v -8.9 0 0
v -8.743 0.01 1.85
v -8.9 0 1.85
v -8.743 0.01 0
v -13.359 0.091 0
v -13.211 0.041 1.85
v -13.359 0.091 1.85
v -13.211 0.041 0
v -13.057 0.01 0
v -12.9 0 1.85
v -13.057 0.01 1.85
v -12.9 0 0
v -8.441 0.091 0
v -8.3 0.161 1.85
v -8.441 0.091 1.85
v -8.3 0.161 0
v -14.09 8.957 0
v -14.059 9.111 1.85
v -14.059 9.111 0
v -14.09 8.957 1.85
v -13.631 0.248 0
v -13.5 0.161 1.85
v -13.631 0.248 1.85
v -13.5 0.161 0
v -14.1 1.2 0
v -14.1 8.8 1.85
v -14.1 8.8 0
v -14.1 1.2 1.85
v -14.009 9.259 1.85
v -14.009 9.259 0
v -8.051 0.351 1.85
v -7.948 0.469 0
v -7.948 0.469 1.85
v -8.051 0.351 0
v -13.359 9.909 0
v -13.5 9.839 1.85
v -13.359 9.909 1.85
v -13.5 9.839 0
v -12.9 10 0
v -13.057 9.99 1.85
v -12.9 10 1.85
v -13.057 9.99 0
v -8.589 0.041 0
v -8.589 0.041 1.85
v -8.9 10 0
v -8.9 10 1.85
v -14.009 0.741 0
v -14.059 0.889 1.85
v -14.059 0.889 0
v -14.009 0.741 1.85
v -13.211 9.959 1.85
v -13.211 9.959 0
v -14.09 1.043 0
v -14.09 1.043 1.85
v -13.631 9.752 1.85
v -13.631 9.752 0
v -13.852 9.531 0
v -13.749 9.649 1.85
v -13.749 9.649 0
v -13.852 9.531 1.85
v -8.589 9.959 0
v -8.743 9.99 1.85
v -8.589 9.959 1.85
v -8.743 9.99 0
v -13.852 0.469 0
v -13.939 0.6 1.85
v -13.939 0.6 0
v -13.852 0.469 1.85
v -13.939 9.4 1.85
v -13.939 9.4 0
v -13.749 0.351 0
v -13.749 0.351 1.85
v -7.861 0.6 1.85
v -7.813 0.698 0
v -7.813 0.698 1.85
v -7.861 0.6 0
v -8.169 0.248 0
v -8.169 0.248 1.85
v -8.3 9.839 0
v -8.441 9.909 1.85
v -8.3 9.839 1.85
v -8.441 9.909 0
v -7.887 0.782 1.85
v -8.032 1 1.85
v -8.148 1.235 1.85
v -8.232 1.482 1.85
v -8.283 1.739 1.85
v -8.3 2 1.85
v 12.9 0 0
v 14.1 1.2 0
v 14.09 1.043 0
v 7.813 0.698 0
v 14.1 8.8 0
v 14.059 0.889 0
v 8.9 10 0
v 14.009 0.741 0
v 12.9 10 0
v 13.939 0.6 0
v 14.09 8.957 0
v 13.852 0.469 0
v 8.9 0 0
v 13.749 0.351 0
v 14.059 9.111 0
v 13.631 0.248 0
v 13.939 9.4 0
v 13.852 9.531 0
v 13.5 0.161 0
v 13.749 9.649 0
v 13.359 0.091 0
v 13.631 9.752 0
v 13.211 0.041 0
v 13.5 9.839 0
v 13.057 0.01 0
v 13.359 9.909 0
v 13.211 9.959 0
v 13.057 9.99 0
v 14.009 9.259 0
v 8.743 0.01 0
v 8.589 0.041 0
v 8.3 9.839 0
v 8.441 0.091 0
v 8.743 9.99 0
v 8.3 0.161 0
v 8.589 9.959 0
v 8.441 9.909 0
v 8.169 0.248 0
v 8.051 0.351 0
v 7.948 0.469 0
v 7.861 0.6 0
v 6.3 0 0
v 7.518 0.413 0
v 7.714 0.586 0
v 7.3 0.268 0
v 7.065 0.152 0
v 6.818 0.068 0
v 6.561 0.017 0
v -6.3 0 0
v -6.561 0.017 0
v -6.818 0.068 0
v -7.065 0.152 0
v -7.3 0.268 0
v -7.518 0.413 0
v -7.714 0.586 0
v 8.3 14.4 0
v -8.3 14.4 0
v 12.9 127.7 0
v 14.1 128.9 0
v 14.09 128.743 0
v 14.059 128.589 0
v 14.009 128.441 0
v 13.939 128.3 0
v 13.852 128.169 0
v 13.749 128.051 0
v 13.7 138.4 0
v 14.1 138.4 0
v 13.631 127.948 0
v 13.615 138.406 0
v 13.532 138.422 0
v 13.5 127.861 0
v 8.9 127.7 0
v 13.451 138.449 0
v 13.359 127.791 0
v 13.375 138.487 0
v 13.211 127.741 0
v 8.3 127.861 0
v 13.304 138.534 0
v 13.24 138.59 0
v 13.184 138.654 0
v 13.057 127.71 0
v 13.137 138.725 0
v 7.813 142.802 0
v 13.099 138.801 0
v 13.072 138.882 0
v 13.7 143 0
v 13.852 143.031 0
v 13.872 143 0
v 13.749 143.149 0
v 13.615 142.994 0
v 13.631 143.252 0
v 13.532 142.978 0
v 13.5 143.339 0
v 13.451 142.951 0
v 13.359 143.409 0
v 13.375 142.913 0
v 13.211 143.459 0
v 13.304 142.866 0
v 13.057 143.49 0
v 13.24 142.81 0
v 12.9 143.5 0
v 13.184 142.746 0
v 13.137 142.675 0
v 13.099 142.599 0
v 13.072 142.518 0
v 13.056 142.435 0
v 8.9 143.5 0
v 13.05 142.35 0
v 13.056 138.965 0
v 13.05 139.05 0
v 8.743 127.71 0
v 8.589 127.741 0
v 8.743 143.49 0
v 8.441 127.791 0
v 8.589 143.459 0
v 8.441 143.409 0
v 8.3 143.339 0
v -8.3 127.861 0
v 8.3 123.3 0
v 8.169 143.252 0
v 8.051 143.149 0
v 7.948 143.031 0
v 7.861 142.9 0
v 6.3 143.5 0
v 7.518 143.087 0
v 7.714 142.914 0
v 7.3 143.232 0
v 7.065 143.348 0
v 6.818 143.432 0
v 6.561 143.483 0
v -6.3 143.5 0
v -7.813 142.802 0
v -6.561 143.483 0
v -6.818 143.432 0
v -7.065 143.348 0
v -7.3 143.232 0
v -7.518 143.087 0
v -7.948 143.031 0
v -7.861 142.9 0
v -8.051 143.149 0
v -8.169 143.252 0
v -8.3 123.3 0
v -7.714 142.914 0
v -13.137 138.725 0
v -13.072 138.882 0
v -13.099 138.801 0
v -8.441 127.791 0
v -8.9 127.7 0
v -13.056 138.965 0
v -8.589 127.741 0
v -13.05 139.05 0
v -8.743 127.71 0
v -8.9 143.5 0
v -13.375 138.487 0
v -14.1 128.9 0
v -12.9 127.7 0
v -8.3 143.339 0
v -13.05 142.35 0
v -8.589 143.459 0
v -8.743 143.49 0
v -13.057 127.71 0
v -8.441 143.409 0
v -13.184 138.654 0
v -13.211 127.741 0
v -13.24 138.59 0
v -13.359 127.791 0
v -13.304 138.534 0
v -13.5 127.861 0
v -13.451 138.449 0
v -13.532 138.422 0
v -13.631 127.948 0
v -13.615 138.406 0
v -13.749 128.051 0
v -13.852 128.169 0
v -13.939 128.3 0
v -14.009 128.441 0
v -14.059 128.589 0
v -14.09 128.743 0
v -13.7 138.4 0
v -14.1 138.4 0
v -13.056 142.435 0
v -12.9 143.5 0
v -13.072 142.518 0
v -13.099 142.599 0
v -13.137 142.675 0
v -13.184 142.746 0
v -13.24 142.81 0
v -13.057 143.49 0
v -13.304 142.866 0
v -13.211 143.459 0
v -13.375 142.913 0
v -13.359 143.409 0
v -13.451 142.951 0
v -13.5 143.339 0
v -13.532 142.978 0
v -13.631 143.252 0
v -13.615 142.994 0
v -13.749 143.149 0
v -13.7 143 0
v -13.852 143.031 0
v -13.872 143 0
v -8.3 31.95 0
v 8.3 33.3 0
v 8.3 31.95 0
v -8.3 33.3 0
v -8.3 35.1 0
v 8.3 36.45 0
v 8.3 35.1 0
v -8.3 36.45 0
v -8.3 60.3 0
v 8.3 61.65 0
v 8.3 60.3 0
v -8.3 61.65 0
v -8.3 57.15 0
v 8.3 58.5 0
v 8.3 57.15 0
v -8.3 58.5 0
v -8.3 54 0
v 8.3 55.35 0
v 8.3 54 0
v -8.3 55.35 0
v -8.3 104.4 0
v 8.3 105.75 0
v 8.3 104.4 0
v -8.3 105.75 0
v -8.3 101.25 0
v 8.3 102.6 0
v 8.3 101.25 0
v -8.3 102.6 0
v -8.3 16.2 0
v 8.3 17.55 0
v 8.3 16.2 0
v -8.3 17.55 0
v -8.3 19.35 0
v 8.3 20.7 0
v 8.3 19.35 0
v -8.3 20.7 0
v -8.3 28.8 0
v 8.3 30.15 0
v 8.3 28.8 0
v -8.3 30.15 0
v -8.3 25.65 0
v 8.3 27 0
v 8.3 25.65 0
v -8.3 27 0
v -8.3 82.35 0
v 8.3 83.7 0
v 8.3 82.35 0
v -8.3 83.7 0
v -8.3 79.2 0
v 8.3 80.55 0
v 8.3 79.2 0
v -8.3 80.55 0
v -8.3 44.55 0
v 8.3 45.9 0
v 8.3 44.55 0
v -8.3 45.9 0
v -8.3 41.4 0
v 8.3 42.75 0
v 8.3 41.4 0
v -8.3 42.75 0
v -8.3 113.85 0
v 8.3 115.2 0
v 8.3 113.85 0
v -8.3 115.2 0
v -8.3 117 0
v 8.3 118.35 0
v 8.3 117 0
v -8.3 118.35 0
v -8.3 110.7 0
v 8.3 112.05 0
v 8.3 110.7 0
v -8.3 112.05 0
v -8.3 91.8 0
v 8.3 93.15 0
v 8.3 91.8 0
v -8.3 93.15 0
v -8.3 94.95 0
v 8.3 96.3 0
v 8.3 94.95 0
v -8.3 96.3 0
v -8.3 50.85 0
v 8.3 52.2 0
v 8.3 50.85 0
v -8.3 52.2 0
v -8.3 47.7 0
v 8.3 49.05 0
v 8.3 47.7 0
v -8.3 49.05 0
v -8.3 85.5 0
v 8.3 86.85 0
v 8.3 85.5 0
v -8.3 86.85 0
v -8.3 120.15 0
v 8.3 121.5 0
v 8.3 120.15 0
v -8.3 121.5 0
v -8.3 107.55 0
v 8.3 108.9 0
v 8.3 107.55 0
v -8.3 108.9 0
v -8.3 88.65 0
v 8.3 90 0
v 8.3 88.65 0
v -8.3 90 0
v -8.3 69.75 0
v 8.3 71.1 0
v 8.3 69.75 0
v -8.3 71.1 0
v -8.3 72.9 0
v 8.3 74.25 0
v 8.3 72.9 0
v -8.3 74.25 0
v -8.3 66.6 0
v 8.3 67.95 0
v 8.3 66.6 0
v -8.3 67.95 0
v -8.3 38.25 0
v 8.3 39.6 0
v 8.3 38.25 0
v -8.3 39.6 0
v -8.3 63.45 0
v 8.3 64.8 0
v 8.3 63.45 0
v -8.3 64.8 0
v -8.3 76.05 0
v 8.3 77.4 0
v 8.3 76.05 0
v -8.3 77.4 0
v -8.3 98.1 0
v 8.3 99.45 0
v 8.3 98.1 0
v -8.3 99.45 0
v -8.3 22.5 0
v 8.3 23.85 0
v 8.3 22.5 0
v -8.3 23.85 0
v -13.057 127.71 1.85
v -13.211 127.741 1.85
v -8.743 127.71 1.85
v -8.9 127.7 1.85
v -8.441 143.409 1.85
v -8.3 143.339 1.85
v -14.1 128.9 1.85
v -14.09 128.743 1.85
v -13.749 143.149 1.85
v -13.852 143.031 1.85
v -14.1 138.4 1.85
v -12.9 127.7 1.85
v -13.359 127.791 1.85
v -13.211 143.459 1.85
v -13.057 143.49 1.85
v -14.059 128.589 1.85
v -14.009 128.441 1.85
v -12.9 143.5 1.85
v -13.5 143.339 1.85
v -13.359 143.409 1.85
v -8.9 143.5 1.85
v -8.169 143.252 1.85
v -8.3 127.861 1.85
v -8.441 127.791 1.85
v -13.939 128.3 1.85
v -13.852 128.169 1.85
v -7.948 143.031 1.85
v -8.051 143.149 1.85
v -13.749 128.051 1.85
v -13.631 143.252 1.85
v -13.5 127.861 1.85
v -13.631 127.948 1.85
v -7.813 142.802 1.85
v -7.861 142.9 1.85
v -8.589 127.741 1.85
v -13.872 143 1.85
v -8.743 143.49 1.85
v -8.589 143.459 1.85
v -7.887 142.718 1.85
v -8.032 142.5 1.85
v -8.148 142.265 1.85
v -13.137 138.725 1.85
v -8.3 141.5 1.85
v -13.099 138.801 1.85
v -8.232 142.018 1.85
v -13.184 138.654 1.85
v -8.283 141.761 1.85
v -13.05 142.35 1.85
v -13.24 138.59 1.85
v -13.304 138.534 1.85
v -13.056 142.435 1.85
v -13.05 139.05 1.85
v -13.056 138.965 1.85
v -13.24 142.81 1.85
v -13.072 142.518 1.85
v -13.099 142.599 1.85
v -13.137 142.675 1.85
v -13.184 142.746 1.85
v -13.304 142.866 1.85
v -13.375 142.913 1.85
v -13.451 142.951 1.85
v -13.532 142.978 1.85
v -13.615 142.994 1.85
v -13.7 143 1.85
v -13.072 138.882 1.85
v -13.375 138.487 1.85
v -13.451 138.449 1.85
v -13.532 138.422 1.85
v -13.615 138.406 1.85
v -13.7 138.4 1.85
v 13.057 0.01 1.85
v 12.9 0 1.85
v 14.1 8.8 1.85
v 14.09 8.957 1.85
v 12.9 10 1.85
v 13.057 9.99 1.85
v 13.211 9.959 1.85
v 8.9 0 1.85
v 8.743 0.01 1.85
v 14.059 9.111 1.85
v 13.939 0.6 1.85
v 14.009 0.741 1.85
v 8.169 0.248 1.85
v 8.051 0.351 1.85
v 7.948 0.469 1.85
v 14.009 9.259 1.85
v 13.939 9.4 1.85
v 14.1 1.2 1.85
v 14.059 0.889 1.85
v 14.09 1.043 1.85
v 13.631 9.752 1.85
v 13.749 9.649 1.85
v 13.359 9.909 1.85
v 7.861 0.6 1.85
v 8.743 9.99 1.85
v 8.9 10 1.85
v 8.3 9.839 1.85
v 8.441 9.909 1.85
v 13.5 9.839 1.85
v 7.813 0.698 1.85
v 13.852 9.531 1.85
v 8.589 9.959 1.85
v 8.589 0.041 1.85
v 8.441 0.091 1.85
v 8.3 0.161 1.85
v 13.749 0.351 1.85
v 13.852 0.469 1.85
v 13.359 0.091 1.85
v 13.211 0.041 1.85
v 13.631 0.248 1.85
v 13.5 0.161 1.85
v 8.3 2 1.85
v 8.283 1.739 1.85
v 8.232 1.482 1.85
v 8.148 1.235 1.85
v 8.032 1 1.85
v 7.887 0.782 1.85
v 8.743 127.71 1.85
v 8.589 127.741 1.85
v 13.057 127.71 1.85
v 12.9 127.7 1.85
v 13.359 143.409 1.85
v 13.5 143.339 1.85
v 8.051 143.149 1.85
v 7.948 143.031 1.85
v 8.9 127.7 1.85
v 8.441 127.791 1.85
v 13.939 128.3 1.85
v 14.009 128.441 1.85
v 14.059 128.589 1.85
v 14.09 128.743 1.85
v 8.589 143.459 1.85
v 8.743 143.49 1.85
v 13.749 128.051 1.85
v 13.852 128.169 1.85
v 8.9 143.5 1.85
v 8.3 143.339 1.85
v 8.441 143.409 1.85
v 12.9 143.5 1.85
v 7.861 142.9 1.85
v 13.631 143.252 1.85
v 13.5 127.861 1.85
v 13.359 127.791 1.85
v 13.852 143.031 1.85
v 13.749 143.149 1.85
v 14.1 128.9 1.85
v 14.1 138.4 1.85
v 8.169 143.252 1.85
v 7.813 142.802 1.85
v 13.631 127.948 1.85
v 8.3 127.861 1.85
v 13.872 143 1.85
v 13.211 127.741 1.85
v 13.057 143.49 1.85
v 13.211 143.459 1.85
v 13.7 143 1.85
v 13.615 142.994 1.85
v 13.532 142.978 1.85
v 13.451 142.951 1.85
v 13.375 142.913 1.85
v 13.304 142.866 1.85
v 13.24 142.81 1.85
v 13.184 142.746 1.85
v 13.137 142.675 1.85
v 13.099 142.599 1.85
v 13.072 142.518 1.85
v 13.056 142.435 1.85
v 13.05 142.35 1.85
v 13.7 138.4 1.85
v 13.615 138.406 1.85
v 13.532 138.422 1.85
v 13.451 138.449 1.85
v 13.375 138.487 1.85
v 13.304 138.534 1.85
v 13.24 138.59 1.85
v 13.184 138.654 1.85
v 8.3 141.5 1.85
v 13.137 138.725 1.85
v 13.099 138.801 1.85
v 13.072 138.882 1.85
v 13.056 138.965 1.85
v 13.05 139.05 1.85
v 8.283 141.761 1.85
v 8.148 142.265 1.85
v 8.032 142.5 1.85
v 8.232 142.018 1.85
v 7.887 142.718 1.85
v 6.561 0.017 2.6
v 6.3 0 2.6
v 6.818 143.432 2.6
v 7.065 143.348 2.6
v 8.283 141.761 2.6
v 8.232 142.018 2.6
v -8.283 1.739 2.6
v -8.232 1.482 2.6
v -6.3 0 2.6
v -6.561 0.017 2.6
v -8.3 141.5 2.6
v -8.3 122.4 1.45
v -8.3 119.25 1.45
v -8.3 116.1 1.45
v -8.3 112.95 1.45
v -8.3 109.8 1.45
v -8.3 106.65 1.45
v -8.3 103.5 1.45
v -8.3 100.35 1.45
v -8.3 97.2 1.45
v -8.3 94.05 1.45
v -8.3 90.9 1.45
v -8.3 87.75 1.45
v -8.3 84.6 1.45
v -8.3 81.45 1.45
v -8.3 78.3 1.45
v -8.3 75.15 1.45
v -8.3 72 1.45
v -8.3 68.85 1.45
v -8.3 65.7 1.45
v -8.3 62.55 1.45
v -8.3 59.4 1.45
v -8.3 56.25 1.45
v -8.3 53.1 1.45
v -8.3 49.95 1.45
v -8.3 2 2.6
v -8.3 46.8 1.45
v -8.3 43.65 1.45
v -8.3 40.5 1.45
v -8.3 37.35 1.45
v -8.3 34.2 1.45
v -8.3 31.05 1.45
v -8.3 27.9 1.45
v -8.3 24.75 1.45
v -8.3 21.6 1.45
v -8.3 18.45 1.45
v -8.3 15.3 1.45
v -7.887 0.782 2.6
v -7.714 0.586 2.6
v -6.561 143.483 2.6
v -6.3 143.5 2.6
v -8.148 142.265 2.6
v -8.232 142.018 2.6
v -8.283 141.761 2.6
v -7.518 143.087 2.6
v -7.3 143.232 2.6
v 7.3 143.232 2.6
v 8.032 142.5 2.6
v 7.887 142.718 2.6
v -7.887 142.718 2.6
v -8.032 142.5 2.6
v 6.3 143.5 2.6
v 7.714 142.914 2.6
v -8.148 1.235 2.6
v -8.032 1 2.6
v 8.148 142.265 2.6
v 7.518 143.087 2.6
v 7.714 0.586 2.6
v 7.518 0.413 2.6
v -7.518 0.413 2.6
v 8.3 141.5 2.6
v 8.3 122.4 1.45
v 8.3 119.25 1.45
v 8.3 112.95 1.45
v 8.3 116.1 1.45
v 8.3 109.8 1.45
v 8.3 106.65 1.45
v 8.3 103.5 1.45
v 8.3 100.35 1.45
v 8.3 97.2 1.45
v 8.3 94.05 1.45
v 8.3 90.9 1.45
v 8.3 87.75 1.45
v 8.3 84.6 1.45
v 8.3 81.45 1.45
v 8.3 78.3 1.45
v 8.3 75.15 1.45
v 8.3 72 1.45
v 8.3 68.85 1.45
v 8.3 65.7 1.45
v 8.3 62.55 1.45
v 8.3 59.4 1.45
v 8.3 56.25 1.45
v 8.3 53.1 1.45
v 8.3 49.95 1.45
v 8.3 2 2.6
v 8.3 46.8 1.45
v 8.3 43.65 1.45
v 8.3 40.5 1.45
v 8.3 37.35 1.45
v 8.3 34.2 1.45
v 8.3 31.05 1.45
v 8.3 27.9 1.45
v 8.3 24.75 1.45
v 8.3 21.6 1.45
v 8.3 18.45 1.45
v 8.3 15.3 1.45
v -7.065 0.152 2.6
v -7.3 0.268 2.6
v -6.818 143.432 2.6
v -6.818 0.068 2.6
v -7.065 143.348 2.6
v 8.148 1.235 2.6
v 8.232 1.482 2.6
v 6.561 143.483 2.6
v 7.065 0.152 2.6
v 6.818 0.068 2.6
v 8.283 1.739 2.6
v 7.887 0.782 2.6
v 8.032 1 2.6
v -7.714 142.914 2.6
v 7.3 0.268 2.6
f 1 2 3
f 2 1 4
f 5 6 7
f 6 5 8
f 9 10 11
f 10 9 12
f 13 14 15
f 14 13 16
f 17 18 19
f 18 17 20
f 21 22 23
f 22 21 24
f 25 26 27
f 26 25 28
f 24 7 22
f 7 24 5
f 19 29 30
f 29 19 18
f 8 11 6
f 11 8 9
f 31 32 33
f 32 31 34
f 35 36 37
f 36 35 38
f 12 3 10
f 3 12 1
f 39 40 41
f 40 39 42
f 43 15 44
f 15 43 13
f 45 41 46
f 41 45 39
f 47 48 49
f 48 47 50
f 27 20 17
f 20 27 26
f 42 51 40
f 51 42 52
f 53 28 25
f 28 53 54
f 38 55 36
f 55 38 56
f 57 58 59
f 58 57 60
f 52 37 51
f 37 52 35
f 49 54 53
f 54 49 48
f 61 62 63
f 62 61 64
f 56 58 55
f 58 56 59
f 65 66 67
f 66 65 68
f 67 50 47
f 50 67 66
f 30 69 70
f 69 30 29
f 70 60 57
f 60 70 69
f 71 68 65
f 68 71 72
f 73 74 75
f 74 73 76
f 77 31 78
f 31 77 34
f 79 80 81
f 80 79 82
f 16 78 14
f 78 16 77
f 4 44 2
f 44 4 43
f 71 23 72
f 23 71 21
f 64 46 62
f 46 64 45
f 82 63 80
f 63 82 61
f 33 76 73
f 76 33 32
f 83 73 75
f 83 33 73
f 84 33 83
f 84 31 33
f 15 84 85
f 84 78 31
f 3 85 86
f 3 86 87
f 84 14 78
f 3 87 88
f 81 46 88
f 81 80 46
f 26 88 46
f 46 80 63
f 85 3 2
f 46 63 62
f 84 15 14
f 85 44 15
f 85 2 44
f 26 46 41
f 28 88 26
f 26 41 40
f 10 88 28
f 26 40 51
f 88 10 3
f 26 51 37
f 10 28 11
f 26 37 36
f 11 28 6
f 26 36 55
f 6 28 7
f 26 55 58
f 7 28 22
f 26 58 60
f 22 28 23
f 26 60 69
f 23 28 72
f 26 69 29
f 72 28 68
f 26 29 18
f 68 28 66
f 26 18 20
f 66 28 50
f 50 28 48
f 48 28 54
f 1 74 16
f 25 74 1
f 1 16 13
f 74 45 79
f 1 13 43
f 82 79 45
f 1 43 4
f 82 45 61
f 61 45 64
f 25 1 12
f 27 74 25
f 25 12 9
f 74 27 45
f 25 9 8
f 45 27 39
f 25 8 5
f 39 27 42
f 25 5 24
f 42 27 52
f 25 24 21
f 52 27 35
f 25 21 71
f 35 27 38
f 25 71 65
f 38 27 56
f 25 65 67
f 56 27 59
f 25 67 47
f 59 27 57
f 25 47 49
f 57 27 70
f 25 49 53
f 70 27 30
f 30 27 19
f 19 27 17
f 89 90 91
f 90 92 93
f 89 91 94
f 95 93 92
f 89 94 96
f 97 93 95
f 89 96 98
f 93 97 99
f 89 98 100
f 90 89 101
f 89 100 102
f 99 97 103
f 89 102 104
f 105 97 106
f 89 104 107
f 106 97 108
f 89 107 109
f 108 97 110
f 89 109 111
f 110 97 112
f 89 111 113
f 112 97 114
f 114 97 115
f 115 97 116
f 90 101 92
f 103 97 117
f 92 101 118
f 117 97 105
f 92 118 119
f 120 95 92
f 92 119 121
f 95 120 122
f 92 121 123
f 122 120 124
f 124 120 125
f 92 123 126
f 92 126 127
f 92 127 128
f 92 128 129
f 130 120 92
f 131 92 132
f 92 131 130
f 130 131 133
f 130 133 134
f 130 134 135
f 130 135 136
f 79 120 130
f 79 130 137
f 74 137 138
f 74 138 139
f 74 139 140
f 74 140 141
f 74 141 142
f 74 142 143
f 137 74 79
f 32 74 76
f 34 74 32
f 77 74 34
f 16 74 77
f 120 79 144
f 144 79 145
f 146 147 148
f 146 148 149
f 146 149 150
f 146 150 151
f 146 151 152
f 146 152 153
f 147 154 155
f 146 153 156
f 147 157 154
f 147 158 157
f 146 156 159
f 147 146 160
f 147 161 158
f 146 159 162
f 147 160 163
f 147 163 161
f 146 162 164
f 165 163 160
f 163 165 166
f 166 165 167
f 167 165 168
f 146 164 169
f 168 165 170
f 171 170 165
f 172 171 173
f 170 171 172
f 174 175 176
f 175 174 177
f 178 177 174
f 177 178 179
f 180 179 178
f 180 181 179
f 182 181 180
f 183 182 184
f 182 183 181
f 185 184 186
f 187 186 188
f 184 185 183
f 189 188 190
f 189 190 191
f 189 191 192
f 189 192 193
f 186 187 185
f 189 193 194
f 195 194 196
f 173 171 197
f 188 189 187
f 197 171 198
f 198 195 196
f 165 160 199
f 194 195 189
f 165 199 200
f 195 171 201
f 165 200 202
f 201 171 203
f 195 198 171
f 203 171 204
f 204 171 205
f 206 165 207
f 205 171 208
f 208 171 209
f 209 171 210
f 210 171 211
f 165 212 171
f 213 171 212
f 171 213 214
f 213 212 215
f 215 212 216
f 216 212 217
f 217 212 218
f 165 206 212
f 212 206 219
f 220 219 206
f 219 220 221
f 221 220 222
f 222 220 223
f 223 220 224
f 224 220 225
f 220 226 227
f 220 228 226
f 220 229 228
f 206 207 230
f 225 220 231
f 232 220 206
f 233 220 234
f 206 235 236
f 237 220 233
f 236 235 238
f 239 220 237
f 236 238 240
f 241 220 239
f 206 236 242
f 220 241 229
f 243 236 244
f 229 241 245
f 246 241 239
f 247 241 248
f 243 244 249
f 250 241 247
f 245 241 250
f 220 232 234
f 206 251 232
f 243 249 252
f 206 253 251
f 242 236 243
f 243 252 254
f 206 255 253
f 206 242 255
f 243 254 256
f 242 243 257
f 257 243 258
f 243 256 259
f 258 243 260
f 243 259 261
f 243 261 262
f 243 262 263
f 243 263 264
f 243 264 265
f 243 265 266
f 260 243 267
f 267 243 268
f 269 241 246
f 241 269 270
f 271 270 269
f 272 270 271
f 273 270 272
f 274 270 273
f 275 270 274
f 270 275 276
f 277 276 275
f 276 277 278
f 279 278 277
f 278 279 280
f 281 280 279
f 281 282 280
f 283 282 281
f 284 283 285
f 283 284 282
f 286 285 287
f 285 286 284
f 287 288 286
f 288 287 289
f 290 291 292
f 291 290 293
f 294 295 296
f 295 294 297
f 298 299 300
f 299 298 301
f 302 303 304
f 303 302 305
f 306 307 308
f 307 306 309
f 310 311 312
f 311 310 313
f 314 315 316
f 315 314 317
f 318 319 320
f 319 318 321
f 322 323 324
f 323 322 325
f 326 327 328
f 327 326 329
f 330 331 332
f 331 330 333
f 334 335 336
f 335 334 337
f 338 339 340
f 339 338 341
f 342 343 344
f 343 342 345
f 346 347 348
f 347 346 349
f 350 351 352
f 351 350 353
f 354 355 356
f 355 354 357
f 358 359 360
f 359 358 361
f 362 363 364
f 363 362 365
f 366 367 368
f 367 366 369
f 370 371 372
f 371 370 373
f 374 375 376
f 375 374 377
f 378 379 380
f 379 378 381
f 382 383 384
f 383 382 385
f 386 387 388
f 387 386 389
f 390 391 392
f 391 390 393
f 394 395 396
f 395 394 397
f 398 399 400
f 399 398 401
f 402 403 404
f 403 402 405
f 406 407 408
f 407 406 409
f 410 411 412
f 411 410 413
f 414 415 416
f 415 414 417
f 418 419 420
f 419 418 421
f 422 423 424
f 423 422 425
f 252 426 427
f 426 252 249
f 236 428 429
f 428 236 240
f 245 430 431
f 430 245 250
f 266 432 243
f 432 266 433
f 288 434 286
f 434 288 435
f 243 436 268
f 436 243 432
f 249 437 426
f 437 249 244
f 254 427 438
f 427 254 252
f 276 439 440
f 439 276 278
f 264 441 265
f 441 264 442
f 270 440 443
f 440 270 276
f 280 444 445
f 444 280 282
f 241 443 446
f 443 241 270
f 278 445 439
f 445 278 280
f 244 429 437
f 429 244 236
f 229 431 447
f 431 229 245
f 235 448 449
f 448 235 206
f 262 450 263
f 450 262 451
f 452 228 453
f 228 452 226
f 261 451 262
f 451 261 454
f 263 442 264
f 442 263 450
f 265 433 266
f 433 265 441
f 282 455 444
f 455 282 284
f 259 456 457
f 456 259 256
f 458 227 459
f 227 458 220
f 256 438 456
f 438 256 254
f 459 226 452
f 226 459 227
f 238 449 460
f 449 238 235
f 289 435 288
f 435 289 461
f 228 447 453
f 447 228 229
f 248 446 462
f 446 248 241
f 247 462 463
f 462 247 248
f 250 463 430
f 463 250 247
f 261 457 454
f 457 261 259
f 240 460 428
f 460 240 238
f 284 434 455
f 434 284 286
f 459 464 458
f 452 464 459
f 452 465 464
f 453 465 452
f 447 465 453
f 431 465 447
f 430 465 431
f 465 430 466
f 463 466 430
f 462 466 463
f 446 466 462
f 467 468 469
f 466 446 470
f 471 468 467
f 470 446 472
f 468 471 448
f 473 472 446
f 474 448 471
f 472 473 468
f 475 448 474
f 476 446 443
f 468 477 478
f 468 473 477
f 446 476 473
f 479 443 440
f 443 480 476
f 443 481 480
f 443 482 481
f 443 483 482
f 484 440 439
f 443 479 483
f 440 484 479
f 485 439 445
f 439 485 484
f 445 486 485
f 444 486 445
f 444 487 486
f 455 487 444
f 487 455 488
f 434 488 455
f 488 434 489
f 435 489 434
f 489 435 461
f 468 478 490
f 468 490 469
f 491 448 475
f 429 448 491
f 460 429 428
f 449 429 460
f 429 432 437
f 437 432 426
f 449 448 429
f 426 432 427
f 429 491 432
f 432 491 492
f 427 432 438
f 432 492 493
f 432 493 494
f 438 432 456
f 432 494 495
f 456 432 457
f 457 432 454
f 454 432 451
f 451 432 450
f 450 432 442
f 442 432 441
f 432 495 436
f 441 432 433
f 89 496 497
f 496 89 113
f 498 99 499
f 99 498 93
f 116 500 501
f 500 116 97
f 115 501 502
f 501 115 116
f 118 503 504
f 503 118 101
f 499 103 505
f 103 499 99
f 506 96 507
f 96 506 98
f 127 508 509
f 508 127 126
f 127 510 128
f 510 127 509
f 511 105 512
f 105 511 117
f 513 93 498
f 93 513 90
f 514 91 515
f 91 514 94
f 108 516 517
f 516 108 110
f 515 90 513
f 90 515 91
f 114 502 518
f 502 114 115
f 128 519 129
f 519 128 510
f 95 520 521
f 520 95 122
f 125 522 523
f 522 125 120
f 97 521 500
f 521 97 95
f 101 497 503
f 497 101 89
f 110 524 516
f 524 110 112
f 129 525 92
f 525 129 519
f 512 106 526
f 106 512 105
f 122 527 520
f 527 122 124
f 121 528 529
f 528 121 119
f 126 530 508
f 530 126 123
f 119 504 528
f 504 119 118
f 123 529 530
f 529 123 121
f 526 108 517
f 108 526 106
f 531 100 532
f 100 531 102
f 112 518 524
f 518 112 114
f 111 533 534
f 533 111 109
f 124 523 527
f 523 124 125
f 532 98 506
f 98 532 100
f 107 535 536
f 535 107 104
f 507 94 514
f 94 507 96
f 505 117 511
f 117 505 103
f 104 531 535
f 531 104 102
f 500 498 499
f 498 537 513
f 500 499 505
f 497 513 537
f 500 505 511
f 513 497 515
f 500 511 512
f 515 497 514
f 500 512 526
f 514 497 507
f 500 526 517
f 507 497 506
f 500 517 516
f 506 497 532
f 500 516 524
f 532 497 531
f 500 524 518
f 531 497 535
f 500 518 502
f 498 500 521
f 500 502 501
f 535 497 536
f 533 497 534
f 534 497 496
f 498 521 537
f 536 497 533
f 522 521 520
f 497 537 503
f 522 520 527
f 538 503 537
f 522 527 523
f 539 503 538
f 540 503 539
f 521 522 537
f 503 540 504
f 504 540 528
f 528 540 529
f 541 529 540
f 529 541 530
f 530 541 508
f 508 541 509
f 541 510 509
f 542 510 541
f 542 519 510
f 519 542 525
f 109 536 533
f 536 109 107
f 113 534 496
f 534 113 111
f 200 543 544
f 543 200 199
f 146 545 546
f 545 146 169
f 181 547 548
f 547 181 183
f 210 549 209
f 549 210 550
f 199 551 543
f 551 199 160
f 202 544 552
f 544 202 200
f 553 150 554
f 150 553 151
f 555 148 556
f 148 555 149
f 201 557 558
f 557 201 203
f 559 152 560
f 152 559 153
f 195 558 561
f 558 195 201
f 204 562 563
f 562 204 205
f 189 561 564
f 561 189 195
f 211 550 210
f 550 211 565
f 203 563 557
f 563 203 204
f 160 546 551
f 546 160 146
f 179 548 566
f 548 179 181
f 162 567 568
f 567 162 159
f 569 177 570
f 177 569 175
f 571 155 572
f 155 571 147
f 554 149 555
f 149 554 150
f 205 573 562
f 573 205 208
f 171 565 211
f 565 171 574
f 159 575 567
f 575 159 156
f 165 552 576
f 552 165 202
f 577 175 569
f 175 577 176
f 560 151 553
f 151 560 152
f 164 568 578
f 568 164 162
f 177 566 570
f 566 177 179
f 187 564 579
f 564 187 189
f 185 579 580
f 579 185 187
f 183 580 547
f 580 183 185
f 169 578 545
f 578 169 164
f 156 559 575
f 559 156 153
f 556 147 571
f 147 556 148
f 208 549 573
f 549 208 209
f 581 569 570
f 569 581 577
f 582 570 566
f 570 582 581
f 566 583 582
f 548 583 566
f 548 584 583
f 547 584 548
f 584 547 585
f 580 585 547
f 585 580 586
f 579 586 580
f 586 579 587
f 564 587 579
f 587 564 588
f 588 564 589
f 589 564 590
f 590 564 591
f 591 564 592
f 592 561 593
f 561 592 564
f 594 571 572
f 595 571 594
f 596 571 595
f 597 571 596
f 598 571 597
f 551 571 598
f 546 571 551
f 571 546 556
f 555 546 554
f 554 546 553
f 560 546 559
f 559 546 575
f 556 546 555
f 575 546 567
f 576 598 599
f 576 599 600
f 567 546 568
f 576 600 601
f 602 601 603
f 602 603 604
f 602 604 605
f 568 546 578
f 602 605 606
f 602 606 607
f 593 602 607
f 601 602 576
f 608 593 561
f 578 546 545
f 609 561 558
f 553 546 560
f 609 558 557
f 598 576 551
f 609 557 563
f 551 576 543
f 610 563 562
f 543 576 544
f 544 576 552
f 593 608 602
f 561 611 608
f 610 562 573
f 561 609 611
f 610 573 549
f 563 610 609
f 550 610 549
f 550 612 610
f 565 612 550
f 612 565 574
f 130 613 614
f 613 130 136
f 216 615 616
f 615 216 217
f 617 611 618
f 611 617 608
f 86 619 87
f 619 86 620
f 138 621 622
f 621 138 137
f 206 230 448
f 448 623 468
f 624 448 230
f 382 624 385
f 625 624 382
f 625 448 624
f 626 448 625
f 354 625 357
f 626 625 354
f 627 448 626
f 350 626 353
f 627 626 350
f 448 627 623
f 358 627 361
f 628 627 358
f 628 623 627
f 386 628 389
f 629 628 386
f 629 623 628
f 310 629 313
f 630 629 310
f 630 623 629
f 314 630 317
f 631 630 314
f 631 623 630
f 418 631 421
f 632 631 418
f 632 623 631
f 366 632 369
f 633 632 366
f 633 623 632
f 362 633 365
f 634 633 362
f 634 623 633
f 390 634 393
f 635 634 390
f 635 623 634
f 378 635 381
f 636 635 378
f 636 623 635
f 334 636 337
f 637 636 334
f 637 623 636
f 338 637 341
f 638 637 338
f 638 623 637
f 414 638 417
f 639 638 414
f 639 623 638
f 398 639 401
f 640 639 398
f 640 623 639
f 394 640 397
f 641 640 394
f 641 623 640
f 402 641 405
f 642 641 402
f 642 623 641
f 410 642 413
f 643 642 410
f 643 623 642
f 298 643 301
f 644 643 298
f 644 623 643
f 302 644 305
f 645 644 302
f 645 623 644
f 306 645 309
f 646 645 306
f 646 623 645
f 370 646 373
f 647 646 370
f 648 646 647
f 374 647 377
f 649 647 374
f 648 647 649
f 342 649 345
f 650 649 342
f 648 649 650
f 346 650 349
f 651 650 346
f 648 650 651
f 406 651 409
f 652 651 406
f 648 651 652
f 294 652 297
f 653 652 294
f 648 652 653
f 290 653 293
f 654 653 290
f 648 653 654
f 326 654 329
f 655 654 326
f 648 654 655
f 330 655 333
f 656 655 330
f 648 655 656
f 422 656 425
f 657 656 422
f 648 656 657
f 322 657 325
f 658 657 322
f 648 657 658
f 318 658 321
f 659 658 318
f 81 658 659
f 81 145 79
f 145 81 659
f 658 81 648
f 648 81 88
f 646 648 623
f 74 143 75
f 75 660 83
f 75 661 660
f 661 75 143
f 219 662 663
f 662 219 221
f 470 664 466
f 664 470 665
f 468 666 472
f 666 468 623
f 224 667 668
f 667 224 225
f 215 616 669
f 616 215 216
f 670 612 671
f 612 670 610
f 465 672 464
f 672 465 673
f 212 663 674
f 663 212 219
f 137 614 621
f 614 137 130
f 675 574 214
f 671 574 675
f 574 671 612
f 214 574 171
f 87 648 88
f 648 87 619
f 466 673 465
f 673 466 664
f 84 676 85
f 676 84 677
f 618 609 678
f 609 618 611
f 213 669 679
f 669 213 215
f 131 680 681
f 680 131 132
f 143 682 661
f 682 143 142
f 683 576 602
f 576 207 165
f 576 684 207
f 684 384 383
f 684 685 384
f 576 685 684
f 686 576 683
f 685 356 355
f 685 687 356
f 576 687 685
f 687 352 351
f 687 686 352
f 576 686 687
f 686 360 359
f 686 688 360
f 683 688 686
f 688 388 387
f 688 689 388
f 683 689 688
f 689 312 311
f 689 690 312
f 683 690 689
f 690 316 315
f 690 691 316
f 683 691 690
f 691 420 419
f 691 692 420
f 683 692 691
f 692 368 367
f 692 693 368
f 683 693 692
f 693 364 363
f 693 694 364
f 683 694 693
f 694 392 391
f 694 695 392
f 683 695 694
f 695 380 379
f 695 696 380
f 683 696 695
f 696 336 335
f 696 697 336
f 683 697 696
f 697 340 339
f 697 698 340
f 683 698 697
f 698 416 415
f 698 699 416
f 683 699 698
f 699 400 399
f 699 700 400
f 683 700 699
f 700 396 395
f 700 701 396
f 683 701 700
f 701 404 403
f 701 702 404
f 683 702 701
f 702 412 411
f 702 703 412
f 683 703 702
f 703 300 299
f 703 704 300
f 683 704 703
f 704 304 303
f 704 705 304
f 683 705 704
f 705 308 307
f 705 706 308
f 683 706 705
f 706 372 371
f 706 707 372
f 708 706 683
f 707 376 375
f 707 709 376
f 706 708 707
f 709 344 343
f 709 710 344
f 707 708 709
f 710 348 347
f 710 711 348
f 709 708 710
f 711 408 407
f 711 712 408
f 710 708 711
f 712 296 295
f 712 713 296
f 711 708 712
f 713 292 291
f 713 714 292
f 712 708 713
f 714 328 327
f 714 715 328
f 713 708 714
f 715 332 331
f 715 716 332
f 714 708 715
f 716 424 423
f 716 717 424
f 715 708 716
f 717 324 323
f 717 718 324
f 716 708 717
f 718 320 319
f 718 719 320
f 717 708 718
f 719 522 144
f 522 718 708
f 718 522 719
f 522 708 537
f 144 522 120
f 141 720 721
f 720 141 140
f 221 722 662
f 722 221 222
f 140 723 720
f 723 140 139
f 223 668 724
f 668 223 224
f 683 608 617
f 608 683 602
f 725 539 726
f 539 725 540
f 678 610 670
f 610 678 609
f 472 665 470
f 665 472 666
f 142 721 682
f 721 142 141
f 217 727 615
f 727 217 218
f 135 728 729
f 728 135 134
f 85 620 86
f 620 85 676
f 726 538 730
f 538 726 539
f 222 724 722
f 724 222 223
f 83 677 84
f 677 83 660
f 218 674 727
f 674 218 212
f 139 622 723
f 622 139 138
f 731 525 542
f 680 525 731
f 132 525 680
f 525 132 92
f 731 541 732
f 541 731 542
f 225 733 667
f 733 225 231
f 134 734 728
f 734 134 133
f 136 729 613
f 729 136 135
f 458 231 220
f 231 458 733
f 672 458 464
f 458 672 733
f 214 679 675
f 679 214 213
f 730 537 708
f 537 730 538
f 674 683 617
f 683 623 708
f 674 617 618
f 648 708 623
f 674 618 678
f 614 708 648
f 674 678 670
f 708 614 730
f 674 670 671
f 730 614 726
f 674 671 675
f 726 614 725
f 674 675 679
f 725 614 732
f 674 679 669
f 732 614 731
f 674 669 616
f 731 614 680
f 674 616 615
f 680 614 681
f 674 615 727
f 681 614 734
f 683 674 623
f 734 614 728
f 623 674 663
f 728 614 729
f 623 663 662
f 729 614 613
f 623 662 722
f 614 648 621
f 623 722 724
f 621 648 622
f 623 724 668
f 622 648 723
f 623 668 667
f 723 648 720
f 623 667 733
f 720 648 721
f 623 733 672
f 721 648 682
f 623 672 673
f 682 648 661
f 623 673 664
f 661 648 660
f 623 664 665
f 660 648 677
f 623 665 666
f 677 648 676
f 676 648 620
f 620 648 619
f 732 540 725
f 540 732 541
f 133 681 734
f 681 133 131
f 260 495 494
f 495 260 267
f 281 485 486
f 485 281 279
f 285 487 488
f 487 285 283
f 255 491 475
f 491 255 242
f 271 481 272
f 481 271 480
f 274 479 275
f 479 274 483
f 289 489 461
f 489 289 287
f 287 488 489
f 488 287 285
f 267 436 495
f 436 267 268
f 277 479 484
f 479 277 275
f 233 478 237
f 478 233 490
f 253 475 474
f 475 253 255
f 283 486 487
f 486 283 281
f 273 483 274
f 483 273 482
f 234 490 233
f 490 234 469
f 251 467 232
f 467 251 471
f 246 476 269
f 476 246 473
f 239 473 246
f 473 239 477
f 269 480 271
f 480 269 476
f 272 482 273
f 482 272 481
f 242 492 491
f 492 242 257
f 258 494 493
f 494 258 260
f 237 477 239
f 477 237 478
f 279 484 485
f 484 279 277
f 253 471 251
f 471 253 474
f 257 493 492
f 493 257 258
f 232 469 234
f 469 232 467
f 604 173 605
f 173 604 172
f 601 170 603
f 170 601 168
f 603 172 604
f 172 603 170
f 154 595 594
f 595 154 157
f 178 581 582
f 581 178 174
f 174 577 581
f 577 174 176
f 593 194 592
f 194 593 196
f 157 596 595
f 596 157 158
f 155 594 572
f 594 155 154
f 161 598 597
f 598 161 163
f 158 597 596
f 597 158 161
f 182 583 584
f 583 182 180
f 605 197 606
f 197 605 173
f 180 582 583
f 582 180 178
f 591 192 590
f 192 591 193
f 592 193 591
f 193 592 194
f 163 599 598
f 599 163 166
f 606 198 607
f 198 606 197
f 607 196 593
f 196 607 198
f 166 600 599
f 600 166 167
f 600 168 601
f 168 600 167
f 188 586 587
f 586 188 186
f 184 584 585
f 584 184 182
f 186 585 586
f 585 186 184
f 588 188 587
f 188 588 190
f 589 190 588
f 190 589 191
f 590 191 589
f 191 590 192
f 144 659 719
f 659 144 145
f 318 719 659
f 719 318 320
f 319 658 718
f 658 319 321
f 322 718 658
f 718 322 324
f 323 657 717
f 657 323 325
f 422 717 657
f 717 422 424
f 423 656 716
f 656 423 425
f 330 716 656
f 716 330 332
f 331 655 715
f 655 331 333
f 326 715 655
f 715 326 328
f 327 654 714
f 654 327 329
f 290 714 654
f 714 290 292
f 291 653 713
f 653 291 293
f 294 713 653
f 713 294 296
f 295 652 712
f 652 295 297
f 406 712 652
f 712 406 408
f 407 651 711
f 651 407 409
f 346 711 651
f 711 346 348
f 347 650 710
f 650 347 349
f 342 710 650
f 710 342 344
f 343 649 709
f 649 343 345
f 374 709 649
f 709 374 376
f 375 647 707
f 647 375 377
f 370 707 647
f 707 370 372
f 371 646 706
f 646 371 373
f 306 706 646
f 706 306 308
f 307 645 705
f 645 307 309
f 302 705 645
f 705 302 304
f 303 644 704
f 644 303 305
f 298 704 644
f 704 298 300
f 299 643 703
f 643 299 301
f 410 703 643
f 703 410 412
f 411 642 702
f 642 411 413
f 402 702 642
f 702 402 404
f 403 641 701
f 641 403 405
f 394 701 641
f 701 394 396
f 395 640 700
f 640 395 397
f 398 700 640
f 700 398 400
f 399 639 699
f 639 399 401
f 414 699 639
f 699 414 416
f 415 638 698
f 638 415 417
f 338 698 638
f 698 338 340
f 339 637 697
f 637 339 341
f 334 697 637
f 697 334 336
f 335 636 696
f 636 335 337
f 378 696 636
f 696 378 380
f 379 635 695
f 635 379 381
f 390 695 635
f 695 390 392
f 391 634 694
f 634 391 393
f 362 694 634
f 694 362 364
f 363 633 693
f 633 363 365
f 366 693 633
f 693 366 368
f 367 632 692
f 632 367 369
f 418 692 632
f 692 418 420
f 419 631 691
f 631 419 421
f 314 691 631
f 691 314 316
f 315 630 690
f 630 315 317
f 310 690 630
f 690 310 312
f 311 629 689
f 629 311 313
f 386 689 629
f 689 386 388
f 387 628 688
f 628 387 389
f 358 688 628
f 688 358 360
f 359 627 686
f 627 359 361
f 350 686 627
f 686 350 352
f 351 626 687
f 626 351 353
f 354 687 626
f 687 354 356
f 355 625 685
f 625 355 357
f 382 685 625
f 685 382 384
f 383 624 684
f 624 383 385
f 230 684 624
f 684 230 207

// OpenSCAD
// file: strap_system_parameters.scad
/*
  Shared dimensions for the sliding strap and its rigid-case negative modifier.
  Units: millimetres.

  IMPORTANT COUPLED DIMENSIONS:
  - strap_length, strap_moving_ear_length, strap_travel and track_hard_stop_overtravel
    define both the moving ear position and the lower end of its guide track.
  - strap_stow_notch_offset and strap_travel define the deployed detent/spring position.
  - track_center_spacing, track_width and ear_width define the lateral fit.
  Change these here once. Both strap_parametric.scad and
  strap_housing_negative.scad include this file.

  Reference dimensions reproduce the physically tested S25 Ultra strap geometry.
  For another phone, adapt these dimensions to its usable rear panel.
*/

// Main flexible band (print bed is z=0; band extends to +Z)
strap_length = 143.50;
strap_band_width = 16.60;
strap_thickness = 2.60;
strap_corner_radius = 2.00;

// Ears (two per end, one in each side track)
// The ear must overlap the band to stay attached, so the ear centres follow the
// band half-width: with a 16.60 band (half 8.30) and a 6.40 ear, the inner edge
// sits at 7.70, giving 0.60 mm of overlap.
strap_ear_width = 6.40;
strap_ear_center_spacing = 21.80;  // centres at +/-10.90 from band centre
strap_ear_thickness = 1.85;
strap_fixed_ear_length = 10.00;
strap_moving_ear_length = 15.80;
strap_ear_corner_radius = 1.20;
strap_fixed_socket_clearance = 0.35;

// Motion and locking: these values MUST stay coupled between strap and housing.
strap_travel = 33.00;
track_hard_stop_overtravel = 0.20;
strap_stow_notch_offset = 2.80;  // notch centre behind moving end in stowed position
strap_notch_length = 4.60;
strap_notch_corner_radius = 0.65;
strap_detent_lateral_clearance = 0.25;
strap_detent_nose_depth = 1.55;

// Flexure grooves in the TPU strap. Grooves are only across the flexible span.
strap_groove_pitch = 3.15;
// Groove count is derived from the available flexible span so changed strap lengths
// keep the same nominal pitch without crossing into either ear transition.
strap_groove_mouth = 1.80;
strap_groove_depth = 1.45;
strap_groove_cut_below_face = 0.15;
strap_groove_end_transition = 4.40;

// Negative modifier geometry for the rigid case.
// The lateral clearance is the gap between each side of the ear and its track.
// 0.80 mm = two 0.40 mm extrusion widths, so a slicer leaves it as a real void
// instead of filling a sub-line-width gap. Track spacing and width are derived
// from the ear so this can never drift out of step with the strap.
strap_track_lateral_clearance = 0.80;
track_center_spacing = strap_ear_center_spacing + strap_track_lateral_clearance;
track_width = strap_ear_width + strap_track_lateral_clearance;
track_floor_thickness = 0.60;
backplate_thickness = 2.65;
negative_cut_overrun = 0.55; // extend cut past top surface for robust boolean subtraction
strap_window_width = 17.20;
strap_window_end_clearance = 1.10;
strap_window_corner_radius = 2.50;

// Vertical clearance below the spring beam. The 0.20 mm default was tested by
// the project owner with a 0.20 mm layer profile and a 0.6 mm nozzle when the
// housing is applied as a slicer negative-volume modifier. Other printers and
// materials may need a larger value; inspect the actual bridge toolpath.
spring_air_gap = 0.20;
spring_body_width = 1.00;
spring_relief_width = 0.70;
spring_beam_half_length = 10.00;
spring_relief_half_length = 9.00; // leaves 1 mm anchored bridge at either end
spring_nose_half_length = 2.00;
spring_nose_samples = 24;

// Derived shared positions. Do not duplicate these formulas in a second file.
track_outer_x = track_center_spacing/2 + track_width/2;
track_inner_x = track_center_spacing/2 - track_width/2;
strap_band_half_width = strap_band_width/2;
strap_ear_center_x = strap_ear_center_spacing/2;

strap_fixed_ear_y0 = 0;
strap_fixed_ear_y1 = strap_fixed_ear_length;
strap_moving_ear_y0_stowed = strap_length - strap_moving_ear_length;
strap_moving_ear_y1_stowed = strap_length;

// Track range includes the entire moving ear at both end positions.
track_y_min = strap_length - strap_moving_ear_length - strap_travel - track_hard_stop_overtravel;
track_y_max = strap_length + 0.35;

// Detent engages after 33 mm travel; track hard stop is 0.20 mm farther on.
strap_notch_y_stowed = strap_length - strap_stow_notch_offset;
spring_detent_y = strap_notch_y_stowed - strap_travel;

// Flex grooves leave an ungrooved transition next to both ear groups.
strap_groove_min_center_y = strap_fixed_ear_length + strap_groove_end_transition + strap_groove_mouth/2;
strap_groove_max_center_y = strap_moving_ear_y0_stowed - strap_groove_end_transition - strap_groove_mouth/2;
strap_groove_count = max(2, floor((strap_groove_max_center_y-strap_groove_min_center_y)/strap_groove_pitch)+1);
// Centre the count * pitch array within the allowed bending span.
strap_groove_first_y = (strap_groove_min_center_y+strap_groove_max_center_y-(strap_groove_count-1)*strap_groove_pitch)/2;
strap_groove_last_y = strap_groove_first_y + (strap_groove_count-1)*strap_groove_pitch;

// Negative modifier apertures / sockets.
strap_window_length = strap_length + 2*strap_window_end_clearance;
strap_window_y0 = -strap_window_end_clearance;
strap_window_y1 = strap_length + strap_window_end_clearance;
track_fixed_socket_y0 = strap_fixed_ear_y0 - strap_fixed_socket_clearance;
track_fixed_socket_y1 = strap_fixed_ear_y1 + strap_fixed_socket_clearance;
// main file
/*
  Parametric TPU sliding strap / kickstand.
  Print material: TPU. Print orientation: grooved underside on build plate (z=0).
  Dimensions shared with strap_housing_negative.scad through strap_system_parameters.scad.

  This is an editable OpenSCAD reference for the original independently designed
  strap module. The adjacent tested STL/STEP are the reference print files.
*/
include <strap_system_parameters.scad>;

$fn = 48;

module rounded_rect_2d(w, h, r) {
    rr = min(r, min(w,h)/2 - 0.01);
    offset(r=rr) square([w-2*rr, h-2*rr], center=true);
}

module rounded_prism_at(cx, cy, w, h, z0, z1, r) {
    translate([cx,cy,z0]) linear_extrude(height=z1-z0) rounded_rect_2d(w,h,r);
}

module strap_band() {
    rounded_prism_at(0, strap_length/2, strap_band_width, strap_length,
                     0, strap_thickness, strap_corner_radius);
}

module strap_ears() {
    for (side = [-1,1]) {
        rounded_prism_at(side*strap_ear_center_x, strap_fixed_ear_length/2,
                         strap_ear_width, strap_fixed_ear_length,
                         0, strap_ear_thickness, strap_ear_corner_radius);
        rounded_prism_at(side*strap_ear_center_x,
                         strap_length-strap_moving_ear_length/2,
                         strap_ear_width, strap_moving_ear_length,
                         0, strap_ear_thickness, strap_ear_corner_radius);
    }
}

module moving_ear_detent_notches() {
    // Side-entry rounded recesses. Their Y position follows the same stow/travel
    // variables that define the spring position in the negative housing modifier.
    notch_x_center = track_outer_x - strap_detent_nose_depth/2 - strap_detent_lateral_clearance/2;
    notch_x_width = strap_detent_nose_depth + strap_detent_lateral_clearance + 0.10;
    for (side = [-1,1]) {
        rounded_prism_at(side*notch_x_center, strap_notch_y_stowed,
                         notch_x_width, strap_notch_length,
                         -0.05, strap_ear_thickness+0.05,
                         strap_notch_corner_radius);
    }
}

module one_flex_groove(yc) {
    half = strap_groove_mouth/2;
    // The 0.15 mm below-face overrun guarantees a clean opening at the print bed.
    // Map local profile (Y,Z) into global Y,Z and extrude across global X.
    multmatrix([[0,0,1,-(strap_band_width/2+0.10)],
                [1,0,0,0],
                [0,1,0,0],
                [0,0,0,1]])
        linear_extrude(height=strap_band_width+0.20, convexity=5)
            polygon([
                [yc-half, -strap_groove_cut_below_face],
                [yc+half, -strap_groove_cut_below_face],
                [yc+half, 0],
                [yc, strap_groove_depth],
                [yc-half, 0]
            ]);
}

module flex_grooves() {
    for (i=[0:strap_groove_count-1])
        one_flex_groove(strap_groove_first_y + i*strap_groove_pitch);
}

module strap_part() {
    difference() {
        union() {
            strap_band();
            strap_ears();
        }
        moving_ear_detent_notches();
        flex_grooves();
    }
}

strap_part();
